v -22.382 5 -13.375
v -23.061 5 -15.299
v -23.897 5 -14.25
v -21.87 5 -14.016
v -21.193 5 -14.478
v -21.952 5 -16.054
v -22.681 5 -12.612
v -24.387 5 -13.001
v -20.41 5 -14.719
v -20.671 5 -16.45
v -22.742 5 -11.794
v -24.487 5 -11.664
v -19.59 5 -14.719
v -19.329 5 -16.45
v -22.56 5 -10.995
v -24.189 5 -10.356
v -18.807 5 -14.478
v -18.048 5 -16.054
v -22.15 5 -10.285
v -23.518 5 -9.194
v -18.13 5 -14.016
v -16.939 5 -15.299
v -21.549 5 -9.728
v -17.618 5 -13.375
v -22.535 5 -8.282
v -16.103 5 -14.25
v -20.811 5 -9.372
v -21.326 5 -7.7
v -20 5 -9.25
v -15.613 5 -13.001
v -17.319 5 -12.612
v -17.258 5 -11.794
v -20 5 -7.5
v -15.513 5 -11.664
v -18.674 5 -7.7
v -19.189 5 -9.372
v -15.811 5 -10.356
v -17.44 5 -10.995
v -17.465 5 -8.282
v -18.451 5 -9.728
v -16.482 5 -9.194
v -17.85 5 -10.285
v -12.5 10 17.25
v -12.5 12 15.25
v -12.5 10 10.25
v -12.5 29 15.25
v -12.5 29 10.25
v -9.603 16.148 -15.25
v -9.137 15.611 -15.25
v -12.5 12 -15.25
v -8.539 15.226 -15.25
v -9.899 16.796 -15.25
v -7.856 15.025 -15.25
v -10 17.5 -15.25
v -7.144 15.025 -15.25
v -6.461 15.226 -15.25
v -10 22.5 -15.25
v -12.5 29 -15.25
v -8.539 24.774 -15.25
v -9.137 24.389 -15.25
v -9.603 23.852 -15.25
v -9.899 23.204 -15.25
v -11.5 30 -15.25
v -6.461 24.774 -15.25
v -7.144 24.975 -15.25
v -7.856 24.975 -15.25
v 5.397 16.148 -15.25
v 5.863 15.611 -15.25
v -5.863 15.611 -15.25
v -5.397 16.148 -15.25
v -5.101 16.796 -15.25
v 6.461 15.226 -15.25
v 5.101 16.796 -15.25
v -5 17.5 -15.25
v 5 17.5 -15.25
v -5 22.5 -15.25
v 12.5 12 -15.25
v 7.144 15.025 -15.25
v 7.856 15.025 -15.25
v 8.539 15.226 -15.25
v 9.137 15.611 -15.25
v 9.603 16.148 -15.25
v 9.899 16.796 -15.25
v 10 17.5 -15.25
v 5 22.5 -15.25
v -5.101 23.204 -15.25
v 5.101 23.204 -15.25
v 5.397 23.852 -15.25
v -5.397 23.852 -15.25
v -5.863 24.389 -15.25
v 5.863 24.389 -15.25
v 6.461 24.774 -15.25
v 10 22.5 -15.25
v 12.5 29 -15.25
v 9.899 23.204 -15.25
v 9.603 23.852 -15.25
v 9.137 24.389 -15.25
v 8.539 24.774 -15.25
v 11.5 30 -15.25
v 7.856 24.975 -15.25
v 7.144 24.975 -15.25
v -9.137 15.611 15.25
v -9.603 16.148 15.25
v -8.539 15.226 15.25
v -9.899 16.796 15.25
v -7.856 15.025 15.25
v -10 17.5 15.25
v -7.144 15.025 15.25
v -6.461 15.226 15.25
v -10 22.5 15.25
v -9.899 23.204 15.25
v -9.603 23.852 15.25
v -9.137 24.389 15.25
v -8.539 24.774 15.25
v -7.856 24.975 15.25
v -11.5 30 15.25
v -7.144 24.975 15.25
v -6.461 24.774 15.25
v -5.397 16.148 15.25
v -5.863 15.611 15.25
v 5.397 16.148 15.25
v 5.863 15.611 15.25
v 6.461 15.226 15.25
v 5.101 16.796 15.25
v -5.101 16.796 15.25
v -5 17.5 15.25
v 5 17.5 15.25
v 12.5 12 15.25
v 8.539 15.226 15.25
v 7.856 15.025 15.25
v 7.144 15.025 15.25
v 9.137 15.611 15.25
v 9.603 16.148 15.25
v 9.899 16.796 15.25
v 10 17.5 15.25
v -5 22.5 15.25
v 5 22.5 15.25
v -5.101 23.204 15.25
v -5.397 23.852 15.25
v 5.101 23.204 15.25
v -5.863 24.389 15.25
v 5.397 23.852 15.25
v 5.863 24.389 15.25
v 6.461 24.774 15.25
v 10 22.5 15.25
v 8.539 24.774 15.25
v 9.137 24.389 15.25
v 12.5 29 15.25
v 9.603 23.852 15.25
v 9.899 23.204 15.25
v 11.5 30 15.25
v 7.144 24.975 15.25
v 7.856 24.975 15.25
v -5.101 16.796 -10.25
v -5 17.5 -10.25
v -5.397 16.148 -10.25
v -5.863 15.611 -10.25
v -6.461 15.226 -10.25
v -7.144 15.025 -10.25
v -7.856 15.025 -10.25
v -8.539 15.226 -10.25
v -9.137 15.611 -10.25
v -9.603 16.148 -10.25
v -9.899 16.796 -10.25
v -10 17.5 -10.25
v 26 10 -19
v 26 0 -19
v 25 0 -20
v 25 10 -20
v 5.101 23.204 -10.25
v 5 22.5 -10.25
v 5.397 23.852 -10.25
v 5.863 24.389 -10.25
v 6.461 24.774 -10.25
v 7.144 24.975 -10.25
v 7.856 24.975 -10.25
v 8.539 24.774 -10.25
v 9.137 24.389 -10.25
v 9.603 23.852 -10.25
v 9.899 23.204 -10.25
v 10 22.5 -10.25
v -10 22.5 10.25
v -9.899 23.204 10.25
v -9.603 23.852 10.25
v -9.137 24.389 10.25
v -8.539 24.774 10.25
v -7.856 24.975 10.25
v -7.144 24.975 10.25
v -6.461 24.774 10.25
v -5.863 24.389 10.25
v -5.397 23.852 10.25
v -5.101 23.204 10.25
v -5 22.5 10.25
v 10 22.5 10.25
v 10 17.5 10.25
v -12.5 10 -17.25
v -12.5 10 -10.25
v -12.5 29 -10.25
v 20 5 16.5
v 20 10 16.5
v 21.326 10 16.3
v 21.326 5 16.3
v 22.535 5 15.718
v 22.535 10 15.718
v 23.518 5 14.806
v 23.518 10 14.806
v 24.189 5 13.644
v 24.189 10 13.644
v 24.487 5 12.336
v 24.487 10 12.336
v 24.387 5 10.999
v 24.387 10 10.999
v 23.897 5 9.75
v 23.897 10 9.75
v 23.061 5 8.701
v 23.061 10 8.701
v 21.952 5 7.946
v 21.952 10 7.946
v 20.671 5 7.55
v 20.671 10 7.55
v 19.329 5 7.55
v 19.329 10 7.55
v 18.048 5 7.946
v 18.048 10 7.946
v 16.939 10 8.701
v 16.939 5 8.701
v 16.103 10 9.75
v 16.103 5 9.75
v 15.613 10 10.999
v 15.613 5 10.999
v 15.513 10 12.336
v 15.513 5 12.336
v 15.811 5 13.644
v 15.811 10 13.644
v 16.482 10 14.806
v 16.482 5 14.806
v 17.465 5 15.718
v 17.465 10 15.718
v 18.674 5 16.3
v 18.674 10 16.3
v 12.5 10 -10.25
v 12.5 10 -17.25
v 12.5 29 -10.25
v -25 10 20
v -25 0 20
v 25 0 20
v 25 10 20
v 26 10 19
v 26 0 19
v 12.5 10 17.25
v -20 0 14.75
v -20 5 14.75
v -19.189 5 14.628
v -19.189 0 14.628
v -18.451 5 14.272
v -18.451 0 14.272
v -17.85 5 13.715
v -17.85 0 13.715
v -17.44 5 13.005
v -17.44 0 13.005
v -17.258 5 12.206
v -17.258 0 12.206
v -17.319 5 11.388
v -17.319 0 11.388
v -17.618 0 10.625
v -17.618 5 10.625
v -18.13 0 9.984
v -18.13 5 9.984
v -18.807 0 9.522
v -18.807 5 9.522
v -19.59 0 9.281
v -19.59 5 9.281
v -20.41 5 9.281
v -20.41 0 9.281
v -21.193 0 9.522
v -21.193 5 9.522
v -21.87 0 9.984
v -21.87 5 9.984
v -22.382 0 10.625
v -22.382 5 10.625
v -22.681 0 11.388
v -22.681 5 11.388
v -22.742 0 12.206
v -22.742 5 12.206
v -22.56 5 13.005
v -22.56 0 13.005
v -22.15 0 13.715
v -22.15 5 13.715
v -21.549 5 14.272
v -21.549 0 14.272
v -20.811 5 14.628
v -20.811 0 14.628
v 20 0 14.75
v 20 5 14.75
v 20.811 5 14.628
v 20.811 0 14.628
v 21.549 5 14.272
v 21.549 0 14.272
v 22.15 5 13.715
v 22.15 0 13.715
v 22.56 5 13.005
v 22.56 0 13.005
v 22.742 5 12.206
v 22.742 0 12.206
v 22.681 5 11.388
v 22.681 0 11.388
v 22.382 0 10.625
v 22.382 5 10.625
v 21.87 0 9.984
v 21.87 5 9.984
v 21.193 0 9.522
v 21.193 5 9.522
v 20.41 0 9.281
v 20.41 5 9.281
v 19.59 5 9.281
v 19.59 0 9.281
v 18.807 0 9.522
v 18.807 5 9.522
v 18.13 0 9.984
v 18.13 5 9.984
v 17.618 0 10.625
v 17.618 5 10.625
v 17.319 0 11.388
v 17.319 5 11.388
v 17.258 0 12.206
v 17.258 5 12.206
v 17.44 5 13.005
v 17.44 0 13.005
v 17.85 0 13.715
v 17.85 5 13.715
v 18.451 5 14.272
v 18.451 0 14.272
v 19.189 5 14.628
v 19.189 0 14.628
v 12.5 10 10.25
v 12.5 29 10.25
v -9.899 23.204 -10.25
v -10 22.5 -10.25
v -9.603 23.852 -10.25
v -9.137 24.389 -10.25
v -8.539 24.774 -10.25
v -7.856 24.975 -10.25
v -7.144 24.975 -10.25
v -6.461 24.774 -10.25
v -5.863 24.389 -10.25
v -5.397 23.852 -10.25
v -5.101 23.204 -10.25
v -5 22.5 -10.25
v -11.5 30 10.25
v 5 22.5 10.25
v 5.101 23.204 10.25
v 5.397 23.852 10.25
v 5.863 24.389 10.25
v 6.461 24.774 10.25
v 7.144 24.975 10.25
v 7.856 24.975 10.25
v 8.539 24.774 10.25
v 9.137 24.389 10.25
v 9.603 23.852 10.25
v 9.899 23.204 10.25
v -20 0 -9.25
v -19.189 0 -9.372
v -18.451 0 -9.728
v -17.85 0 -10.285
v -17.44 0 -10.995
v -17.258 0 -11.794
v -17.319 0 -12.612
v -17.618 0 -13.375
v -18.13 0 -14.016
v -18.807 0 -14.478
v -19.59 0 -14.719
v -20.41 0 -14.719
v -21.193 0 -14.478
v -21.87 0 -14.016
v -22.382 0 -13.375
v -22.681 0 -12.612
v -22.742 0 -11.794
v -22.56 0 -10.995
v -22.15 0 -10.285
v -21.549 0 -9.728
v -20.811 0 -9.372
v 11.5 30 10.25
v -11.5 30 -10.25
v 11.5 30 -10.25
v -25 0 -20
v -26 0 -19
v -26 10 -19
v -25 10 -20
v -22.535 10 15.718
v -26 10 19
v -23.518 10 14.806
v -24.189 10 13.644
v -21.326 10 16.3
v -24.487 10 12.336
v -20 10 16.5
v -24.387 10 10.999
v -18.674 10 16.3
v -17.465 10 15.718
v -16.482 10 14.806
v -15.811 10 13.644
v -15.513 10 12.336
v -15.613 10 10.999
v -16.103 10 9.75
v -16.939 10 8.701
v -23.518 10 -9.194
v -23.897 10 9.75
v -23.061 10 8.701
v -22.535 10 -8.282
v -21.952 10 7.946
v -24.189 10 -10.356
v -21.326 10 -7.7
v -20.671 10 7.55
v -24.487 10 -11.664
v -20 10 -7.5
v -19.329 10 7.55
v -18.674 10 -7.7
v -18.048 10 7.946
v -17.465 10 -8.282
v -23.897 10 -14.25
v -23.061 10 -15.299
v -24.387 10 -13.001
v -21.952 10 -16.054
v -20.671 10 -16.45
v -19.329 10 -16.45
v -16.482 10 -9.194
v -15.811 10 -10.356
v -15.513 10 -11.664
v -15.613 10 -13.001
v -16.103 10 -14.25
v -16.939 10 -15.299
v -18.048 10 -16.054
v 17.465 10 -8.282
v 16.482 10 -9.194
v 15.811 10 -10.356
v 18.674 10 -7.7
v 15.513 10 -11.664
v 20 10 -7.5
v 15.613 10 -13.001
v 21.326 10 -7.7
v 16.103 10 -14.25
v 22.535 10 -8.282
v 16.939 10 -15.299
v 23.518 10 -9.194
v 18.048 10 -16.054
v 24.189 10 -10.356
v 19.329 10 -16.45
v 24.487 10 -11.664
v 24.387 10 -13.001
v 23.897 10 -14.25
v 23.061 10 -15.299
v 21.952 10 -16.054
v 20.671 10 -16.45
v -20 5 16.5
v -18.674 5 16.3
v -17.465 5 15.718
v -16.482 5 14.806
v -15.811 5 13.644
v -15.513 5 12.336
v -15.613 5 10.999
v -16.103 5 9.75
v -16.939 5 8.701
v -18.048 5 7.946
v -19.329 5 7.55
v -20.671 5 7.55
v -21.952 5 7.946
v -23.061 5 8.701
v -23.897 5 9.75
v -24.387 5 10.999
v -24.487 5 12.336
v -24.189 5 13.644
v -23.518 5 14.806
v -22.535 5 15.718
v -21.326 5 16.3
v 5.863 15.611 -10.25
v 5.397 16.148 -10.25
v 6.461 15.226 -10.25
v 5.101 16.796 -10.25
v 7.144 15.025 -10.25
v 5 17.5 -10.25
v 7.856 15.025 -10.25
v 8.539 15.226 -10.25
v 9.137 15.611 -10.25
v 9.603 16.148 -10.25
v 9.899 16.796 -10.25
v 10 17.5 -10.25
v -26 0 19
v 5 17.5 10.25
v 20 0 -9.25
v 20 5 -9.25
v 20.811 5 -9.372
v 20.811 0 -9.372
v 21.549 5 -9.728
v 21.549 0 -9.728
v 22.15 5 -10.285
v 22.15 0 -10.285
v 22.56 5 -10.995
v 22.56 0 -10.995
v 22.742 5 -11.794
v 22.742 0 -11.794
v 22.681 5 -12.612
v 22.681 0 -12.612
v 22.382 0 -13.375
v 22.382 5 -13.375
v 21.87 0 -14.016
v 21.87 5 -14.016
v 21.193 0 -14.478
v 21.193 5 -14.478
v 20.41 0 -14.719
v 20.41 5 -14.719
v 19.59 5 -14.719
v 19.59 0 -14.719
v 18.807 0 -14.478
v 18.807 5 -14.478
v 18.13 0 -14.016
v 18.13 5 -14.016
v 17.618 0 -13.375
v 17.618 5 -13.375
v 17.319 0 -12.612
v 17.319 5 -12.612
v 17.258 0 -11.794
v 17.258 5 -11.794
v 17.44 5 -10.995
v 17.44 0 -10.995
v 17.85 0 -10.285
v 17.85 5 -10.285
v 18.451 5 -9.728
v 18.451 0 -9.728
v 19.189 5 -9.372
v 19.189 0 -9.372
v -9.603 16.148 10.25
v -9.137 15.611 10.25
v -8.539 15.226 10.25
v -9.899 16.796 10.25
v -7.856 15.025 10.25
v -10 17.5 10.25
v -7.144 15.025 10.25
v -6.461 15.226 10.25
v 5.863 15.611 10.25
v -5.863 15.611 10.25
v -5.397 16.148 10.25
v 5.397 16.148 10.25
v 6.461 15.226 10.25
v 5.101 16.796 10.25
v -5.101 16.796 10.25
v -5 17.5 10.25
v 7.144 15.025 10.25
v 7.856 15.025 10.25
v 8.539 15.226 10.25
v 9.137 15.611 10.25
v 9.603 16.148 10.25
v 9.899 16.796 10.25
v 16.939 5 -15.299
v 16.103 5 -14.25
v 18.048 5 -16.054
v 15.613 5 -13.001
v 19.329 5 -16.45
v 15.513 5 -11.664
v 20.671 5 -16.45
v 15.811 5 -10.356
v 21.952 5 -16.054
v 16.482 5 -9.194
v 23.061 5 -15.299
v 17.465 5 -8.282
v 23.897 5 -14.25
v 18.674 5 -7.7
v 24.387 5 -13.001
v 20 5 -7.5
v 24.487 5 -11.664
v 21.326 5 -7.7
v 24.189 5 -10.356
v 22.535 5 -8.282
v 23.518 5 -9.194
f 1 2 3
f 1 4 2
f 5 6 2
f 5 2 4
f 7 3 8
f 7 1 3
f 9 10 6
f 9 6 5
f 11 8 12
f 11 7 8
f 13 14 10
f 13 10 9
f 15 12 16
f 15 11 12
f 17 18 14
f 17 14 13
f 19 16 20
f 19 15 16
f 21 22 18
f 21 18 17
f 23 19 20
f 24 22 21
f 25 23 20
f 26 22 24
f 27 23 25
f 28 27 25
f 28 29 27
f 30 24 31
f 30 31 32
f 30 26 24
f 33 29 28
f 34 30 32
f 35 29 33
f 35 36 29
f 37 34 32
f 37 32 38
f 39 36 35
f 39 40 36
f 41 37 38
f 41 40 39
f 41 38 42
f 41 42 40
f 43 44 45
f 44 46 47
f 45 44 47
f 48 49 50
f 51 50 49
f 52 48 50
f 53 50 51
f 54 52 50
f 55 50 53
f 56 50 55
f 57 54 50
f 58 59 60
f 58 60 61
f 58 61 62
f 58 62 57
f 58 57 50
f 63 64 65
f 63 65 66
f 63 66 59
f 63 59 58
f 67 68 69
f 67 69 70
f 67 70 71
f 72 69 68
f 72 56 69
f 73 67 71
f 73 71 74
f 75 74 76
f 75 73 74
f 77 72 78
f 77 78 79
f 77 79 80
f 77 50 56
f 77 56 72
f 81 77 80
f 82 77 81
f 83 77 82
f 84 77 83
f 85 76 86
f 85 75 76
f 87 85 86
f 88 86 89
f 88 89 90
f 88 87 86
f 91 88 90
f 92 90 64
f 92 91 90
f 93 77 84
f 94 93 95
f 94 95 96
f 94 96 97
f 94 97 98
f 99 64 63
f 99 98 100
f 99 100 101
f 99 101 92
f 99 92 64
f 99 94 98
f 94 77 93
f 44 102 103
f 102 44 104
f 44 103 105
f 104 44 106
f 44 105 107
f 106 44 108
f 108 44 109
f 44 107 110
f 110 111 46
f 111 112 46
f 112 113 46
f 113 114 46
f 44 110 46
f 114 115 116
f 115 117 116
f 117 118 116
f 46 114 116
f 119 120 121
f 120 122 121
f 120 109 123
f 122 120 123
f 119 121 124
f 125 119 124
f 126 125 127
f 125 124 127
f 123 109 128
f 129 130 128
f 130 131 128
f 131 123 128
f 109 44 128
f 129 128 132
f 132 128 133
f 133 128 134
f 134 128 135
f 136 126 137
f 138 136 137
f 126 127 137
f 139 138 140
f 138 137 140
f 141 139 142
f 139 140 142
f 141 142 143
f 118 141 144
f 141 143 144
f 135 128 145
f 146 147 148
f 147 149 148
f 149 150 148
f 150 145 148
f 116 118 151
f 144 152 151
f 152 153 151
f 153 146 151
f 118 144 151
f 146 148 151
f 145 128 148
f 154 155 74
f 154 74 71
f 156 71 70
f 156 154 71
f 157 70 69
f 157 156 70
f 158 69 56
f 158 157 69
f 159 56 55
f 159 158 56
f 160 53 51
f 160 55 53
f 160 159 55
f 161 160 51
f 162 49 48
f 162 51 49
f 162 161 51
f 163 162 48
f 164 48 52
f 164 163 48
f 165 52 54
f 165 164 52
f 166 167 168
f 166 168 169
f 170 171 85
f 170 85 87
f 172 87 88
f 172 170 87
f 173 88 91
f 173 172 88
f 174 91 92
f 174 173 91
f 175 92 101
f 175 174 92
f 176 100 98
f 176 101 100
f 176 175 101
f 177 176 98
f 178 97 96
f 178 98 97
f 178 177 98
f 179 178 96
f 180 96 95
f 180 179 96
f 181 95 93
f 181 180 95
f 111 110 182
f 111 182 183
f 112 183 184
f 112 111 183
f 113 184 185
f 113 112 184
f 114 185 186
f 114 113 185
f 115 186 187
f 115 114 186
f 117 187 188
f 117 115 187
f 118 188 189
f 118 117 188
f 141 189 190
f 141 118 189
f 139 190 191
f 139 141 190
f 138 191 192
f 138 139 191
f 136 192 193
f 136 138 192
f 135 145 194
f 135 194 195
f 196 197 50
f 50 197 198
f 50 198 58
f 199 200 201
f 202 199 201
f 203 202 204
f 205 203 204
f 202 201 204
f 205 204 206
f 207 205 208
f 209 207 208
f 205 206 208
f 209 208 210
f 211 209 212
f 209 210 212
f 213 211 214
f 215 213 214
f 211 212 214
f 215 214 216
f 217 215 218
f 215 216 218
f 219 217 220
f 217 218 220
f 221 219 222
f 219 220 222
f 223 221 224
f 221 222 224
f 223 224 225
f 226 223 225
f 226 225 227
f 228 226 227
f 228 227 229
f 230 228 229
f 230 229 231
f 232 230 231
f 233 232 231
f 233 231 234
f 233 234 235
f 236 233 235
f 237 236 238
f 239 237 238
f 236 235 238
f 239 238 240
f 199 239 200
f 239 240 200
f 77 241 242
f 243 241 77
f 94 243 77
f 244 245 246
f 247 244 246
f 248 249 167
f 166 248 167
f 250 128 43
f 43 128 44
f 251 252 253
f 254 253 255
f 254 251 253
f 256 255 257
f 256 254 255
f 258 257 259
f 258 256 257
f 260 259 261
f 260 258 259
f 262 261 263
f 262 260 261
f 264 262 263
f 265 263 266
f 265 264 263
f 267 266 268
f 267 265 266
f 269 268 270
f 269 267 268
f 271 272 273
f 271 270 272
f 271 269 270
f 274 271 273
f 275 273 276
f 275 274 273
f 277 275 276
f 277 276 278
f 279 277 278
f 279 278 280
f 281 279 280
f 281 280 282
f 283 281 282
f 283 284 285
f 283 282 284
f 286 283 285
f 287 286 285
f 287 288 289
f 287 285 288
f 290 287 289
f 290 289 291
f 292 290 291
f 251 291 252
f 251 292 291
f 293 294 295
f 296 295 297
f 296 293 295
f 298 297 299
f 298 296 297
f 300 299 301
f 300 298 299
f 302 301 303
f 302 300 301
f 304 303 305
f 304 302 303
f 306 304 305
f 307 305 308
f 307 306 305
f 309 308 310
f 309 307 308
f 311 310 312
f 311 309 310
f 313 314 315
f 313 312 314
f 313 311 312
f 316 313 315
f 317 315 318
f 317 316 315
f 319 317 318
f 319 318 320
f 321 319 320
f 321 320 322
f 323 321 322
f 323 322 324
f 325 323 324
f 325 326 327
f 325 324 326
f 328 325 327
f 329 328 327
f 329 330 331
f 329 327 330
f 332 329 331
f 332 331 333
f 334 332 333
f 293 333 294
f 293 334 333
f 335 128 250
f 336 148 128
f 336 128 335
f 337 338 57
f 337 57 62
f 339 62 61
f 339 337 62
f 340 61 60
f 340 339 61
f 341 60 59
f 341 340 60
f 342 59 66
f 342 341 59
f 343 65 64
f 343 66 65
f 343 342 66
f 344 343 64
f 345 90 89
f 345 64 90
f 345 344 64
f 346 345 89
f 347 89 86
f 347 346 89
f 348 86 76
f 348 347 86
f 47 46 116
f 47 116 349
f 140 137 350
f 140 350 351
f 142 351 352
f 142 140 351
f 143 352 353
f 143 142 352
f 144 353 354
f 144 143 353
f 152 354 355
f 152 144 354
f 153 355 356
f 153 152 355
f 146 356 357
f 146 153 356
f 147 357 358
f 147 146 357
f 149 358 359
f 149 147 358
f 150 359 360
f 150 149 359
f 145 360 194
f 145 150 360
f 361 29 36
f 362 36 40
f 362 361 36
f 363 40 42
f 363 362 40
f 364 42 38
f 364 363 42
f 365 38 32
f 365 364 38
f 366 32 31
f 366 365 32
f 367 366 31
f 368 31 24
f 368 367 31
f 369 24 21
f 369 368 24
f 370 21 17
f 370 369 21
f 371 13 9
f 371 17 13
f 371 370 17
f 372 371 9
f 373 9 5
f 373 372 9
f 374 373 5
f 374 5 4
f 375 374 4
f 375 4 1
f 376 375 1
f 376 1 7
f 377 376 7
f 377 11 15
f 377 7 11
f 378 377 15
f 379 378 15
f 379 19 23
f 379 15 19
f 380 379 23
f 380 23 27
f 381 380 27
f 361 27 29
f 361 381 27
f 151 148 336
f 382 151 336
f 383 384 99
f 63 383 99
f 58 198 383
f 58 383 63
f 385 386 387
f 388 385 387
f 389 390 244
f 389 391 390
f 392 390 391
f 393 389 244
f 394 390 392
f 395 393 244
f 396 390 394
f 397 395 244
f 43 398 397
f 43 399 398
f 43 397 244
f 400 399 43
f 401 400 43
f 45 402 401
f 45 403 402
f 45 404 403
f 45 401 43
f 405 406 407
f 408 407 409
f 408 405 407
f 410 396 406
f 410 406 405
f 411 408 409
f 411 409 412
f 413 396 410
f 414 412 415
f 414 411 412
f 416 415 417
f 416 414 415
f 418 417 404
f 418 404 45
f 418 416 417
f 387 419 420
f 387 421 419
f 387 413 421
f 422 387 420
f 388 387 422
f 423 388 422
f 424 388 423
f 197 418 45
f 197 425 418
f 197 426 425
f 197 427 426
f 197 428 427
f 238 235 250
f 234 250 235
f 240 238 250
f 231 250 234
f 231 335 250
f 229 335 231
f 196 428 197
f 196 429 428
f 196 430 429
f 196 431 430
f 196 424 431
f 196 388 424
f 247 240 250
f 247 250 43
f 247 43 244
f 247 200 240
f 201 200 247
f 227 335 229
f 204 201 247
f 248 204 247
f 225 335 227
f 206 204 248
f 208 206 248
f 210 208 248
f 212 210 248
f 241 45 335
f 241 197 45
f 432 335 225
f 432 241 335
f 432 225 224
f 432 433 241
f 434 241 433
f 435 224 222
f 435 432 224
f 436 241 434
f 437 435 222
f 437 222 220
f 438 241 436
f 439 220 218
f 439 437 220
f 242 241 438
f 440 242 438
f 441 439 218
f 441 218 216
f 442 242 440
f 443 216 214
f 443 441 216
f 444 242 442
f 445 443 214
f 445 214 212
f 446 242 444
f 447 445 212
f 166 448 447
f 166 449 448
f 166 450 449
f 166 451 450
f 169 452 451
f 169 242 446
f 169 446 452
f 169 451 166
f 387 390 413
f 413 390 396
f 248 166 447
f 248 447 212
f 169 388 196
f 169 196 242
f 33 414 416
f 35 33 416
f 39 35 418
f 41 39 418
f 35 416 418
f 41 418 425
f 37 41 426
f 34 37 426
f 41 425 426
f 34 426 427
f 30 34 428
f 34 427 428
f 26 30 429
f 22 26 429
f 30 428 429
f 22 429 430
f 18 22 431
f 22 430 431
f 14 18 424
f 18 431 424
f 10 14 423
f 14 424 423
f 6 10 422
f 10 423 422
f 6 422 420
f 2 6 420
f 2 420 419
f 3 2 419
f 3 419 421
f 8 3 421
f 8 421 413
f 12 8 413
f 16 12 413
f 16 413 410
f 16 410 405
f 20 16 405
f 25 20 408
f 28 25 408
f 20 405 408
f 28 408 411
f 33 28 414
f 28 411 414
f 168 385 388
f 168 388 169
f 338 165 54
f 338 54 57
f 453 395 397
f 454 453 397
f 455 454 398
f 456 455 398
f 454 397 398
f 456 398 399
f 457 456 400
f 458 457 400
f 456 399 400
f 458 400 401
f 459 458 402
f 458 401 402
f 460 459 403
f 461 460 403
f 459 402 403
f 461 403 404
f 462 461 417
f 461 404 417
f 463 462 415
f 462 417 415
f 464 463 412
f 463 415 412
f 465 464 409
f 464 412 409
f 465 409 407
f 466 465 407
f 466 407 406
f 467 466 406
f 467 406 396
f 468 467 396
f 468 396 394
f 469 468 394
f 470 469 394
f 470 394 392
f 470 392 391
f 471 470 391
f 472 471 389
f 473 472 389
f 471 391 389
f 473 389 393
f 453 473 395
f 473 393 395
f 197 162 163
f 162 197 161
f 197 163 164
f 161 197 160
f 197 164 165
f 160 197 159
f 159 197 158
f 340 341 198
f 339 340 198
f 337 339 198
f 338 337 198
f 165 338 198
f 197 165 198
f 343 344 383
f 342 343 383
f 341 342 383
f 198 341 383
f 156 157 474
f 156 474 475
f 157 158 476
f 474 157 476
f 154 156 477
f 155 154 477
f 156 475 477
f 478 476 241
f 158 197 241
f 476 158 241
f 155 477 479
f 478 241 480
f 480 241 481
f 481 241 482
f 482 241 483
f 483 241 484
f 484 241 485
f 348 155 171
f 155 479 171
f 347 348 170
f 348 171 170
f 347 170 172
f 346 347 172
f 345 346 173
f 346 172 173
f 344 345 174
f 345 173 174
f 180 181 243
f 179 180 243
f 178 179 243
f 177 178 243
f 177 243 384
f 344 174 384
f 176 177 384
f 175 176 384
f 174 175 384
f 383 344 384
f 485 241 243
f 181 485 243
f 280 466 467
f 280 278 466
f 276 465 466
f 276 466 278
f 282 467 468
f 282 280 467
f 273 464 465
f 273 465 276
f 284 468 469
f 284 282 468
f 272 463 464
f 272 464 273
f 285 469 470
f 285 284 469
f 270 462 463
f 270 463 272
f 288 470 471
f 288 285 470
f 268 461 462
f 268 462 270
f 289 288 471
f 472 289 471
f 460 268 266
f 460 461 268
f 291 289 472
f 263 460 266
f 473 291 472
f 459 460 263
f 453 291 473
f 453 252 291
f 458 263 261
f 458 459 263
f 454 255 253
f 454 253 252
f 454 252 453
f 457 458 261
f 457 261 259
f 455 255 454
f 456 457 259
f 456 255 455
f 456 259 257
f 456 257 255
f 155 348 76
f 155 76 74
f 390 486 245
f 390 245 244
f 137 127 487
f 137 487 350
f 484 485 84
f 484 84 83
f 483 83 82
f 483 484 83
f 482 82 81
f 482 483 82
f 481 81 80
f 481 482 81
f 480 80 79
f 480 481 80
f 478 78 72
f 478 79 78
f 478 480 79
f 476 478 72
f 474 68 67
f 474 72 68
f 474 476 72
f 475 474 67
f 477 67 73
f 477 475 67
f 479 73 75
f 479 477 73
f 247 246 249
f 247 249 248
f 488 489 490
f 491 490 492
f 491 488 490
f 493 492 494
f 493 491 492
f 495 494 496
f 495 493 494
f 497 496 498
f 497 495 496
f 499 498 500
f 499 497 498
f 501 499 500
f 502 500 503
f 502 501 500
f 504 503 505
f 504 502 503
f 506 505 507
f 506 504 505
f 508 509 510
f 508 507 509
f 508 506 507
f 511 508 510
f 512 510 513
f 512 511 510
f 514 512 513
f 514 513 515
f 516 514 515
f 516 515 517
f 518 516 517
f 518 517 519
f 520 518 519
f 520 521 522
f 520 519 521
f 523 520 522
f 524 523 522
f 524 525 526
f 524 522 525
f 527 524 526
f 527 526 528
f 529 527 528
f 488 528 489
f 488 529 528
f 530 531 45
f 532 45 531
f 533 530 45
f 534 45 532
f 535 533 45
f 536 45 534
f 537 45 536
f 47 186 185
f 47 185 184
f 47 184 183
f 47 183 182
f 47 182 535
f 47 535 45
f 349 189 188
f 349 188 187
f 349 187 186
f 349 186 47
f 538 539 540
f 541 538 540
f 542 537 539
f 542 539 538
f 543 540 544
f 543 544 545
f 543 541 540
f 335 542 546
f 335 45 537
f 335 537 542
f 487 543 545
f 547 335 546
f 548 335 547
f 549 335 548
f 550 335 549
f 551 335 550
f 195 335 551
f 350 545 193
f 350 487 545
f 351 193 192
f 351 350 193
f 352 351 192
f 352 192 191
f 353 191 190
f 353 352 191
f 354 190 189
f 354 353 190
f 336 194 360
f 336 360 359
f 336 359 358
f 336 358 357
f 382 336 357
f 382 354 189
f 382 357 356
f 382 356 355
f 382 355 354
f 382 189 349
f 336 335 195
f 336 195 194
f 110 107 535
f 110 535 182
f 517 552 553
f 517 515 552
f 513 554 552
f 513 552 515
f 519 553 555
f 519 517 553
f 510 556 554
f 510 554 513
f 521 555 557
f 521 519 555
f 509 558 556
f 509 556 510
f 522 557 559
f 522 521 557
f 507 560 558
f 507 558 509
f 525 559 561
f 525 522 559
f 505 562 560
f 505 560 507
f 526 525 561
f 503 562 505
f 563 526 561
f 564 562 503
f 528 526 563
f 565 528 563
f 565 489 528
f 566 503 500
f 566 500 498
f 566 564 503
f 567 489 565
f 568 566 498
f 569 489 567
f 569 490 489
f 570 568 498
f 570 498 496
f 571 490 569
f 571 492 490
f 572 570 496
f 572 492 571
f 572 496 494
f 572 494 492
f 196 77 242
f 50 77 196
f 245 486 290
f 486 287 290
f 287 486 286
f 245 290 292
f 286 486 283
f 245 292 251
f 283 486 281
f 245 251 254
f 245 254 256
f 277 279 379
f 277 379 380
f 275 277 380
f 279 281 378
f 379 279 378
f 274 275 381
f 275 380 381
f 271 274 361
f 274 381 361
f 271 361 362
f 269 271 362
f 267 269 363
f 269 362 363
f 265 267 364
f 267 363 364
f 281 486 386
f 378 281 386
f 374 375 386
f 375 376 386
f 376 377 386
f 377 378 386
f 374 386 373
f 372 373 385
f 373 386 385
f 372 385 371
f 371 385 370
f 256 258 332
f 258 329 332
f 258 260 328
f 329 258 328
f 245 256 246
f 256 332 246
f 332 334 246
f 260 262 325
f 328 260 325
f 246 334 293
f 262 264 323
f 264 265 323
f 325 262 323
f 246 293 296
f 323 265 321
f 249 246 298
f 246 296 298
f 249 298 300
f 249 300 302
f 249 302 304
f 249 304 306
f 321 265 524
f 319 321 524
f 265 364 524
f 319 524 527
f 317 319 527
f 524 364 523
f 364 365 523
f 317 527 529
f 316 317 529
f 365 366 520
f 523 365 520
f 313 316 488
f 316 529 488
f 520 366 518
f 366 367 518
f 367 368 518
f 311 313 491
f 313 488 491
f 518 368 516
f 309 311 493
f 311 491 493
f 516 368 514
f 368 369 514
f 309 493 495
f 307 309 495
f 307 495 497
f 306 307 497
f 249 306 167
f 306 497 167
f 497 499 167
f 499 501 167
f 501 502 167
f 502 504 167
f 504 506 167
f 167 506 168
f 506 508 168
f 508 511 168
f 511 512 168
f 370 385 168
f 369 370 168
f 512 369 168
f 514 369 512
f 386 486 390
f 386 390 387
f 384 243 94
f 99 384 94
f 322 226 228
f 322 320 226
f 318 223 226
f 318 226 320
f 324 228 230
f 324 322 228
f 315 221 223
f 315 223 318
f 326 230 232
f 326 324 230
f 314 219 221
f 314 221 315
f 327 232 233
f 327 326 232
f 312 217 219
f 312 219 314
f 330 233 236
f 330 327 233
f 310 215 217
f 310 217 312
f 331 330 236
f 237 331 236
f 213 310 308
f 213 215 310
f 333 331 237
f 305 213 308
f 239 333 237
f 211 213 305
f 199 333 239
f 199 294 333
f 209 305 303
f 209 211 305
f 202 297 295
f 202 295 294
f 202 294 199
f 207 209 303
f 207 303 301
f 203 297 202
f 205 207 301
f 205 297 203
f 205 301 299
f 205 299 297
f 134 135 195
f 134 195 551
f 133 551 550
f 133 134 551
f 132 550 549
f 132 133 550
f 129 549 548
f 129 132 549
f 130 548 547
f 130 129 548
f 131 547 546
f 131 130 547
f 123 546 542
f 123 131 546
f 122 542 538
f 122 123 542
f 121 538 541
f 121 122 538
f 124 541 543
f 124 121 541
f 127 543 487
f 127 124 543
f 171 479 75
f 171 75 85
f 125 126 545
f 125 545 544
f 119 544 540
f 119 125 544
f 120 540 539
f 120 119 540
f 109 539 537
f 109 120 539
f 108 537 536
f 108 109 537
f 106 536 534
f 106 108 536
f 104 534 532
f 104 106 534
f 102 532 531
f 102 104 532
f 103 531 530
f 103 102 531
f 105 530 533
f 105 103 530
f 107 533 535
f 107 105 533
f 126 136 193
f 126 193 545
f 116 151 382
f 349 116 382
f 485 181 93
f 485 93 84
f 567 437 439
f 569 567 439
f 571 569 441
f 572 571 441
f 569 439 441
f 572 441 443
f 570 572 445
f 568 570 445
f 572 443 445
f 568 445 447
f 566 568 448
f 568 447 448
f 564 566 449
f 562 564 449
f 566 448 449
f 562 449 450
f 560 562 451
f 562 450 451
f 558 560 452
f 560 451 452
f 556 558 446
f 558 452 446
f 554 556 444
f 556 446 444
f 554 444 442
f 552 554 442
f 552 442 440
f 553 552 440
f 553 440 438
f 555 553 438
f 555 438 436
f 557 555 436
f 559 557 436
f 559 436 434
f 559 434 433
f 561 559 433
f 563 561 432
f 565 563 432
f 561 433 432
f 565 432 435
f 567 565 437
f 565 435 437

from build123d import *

# Parameters (mm, degrees)
SKETCH1_W           = 52
SKETCH1_H           = 40
SKETCH1_R           = 2.75
BOSS_EXTRUDE1_DEPTH = 10
SKETCH4_R           = 4.5
CUT_EXTRUDE2_DEPTH  = 5
BOSS_EXTRUDE2_START = -13.5
SKETCH2_W           = 5
SKETCH2_H           = 20
BOSS_EXTRUDE2_DEPTH = 25
CUT_EXTRUDE1_REACH  = 55.09
CHAMFER1_SIZE       = 2
CHAMFER2_SIZE       = 1


with BuildPart() as part:
    # Sketch1 → Boss-Extrude1 (new body)
    with BuildSketch(Plane(origin=(0, 0, 0), x_dir=(1, 0, 0), z_dir=(0, 1, 0))):
        Rectangle(SKETCH1_W, SKETCH1_H)
        with Locations(Location((-20, 12, 0), (0, 0, 270))):
            Circle(SKETCH1_R, mode=Mode.SUBTRACT)
        with Locations(Location((20, 12, 0), (0, 0, 270))):
            Circle(SKETCH1_R, mode=Mode.SUBTRACT)
        with Locations(Location((20, -12, 0), (0, 0, 270))):
            Circle(SKETCH1_R, mode=Mode.SUBTRACT)
        with Locations(Location((-20, -12, 0), (0, 0, 270))):
            Circle(SKETCH1_R, mode=Mode.SUBTRACT)
    extrude(amount=BOSS_EXTRUDE1_DEPTH)

    # Sketch4 → Cut-Extrude2 (cut)
    with BuildSketch(Plane(origin=(0, 10, 0), x_dir=(1, 0, 0), z_dir=(0, 1, 0))):
        with Locations(Location((-20, 12, 0), (0, 0, 270))):
            Circle(SKETCH4_R)
        with Locations(Location((20, 12, 0), (0, 0, 270))):
            Circle(SKETCH4_R)
        with Locations(Location((20, -12, 0), (0, 0, 270))):
            Circle(SKETCH4_R)
        with Locations(Location((-20, -12, 0), (0, 0, 270))):
            Circle(SKETCH4_R)
    extrude(amount=-CUT_EXTRUDE2_DEPTH, mode=Mode.SUBTRACT)

    # Sketch2 → Boss-Extrude2 (add)
    with BuildSketch(Plane(origin=(26, 0, 0), x_dir=(0, 0, -1), z_dir=(1, 0, 0)).offset(BOSS_EXTRUDE2_START)):
        with Locations((-12.75, 20)):
            Rectangle(SKETCH2_W, SKETCH2_H)
        with Locations((12.75, 20)):
            Rectangle(SKETCH2_W, SKETCH2_H)
    extrude(amount=-BOSS_EXTRUDE2_DEPTH)

    # Cut-Extrude1: up to this face of the body (flat: up to its plane)
    cut_extrude1_end = Plane(part.part.faces().sort_by_distance((0, 20, -15.25))[0])
    # Sketch3 → Cut-Extrude1 (cut, up to the picked face)
    with BuildSketch(Plane.XY.offset(15.25), mode=Mode.PRIVATE) as cut_extrude1_sk1:
        with BuildLine():
            Line((-5, 22.5), (-5, 17.5))
            ThreePointArc((-5, 17.5), (-7.5, 15), (-10, 17.5))
            Line((-10, 17.5), (-10, 22.5))
            ThreePointArc((-10, 22.5), (-7.5, 25), (-5, 22.5))
        make_face()
    cut_extrude1_tool1 = split(extrude(cut_extrude1_sk1.sketch, amount=-CUT_EXTRUDE1_REACH, mode=Mode.PRIVATE), bisect_by=cut_extrude1_end, keep=Keep.BOTH, mode=Mode.PRIVATE)
    # Sketch3 → Cut-Extrude1 (cut, up to the picked face)
    with BuildSketch(Plane.XY.offset(15.25), mode=Mode.PRIVATE) as cut_extrude1_sk2:
        with BuildLine():
            Line((10, 22.5), (10, 17.5))
            ThreePointArc((10, 17.5), (7.5, 15), (5, 17.5))
            Line((5, 17.5), (5, 22.5))
            ThreePointArc((5, 22.5), (7.5, 25), (10, 22.5))
        make_face()
    cut_extrude1_tool2 = split(extrude(cut_extrude1_sk2.sketch, amount=-CUT_EXTRUDE1_REACH, mode=Mode.PRIVATE), bisect_by=cut_extrude1_end, keep=Keep.BOTH, mode=Mode.PRIVATE)
    add(cut_extrude1_tool1.solids().sort_by(Axis((-7.5, 20, 15.25), (0, 0, -1)))[0], mode=Mode.SUBTRACT)
    add(cut_extrude1_tool2.solids().sort_by(Axis((7.5, 20, 15.25), (0, 0, -1)))[0], mode=Mode.SUBTRACT)

    # Chamfer1
    chamfer1_edges = [part.edges().sort_by_distance(p)[0] for p in [
        (0, 10, 15.25),
        (0, 10, -15.25),
    ]]
    chamfer(chamfer1_edges, length=CHAMFER1_SIZE)

    # Chamfer2
    chamfer2_edges = [part.edges().sort_by_distance(p)[0] for p in [
        (-12.5, 30, 12.75),
        (12.5, 30, 12.75),
        (-12.5, 30, -12.75),
        (12.5, 30, -12.75),
        (26, 5, 20),
        (-26, 5, 20),
        (-26, 5, -20),
        (26, 5, -20),
    ]]
    chamfer(chamfer2_edges, length=CHAMFER2_SIZE)


solid = part.part
